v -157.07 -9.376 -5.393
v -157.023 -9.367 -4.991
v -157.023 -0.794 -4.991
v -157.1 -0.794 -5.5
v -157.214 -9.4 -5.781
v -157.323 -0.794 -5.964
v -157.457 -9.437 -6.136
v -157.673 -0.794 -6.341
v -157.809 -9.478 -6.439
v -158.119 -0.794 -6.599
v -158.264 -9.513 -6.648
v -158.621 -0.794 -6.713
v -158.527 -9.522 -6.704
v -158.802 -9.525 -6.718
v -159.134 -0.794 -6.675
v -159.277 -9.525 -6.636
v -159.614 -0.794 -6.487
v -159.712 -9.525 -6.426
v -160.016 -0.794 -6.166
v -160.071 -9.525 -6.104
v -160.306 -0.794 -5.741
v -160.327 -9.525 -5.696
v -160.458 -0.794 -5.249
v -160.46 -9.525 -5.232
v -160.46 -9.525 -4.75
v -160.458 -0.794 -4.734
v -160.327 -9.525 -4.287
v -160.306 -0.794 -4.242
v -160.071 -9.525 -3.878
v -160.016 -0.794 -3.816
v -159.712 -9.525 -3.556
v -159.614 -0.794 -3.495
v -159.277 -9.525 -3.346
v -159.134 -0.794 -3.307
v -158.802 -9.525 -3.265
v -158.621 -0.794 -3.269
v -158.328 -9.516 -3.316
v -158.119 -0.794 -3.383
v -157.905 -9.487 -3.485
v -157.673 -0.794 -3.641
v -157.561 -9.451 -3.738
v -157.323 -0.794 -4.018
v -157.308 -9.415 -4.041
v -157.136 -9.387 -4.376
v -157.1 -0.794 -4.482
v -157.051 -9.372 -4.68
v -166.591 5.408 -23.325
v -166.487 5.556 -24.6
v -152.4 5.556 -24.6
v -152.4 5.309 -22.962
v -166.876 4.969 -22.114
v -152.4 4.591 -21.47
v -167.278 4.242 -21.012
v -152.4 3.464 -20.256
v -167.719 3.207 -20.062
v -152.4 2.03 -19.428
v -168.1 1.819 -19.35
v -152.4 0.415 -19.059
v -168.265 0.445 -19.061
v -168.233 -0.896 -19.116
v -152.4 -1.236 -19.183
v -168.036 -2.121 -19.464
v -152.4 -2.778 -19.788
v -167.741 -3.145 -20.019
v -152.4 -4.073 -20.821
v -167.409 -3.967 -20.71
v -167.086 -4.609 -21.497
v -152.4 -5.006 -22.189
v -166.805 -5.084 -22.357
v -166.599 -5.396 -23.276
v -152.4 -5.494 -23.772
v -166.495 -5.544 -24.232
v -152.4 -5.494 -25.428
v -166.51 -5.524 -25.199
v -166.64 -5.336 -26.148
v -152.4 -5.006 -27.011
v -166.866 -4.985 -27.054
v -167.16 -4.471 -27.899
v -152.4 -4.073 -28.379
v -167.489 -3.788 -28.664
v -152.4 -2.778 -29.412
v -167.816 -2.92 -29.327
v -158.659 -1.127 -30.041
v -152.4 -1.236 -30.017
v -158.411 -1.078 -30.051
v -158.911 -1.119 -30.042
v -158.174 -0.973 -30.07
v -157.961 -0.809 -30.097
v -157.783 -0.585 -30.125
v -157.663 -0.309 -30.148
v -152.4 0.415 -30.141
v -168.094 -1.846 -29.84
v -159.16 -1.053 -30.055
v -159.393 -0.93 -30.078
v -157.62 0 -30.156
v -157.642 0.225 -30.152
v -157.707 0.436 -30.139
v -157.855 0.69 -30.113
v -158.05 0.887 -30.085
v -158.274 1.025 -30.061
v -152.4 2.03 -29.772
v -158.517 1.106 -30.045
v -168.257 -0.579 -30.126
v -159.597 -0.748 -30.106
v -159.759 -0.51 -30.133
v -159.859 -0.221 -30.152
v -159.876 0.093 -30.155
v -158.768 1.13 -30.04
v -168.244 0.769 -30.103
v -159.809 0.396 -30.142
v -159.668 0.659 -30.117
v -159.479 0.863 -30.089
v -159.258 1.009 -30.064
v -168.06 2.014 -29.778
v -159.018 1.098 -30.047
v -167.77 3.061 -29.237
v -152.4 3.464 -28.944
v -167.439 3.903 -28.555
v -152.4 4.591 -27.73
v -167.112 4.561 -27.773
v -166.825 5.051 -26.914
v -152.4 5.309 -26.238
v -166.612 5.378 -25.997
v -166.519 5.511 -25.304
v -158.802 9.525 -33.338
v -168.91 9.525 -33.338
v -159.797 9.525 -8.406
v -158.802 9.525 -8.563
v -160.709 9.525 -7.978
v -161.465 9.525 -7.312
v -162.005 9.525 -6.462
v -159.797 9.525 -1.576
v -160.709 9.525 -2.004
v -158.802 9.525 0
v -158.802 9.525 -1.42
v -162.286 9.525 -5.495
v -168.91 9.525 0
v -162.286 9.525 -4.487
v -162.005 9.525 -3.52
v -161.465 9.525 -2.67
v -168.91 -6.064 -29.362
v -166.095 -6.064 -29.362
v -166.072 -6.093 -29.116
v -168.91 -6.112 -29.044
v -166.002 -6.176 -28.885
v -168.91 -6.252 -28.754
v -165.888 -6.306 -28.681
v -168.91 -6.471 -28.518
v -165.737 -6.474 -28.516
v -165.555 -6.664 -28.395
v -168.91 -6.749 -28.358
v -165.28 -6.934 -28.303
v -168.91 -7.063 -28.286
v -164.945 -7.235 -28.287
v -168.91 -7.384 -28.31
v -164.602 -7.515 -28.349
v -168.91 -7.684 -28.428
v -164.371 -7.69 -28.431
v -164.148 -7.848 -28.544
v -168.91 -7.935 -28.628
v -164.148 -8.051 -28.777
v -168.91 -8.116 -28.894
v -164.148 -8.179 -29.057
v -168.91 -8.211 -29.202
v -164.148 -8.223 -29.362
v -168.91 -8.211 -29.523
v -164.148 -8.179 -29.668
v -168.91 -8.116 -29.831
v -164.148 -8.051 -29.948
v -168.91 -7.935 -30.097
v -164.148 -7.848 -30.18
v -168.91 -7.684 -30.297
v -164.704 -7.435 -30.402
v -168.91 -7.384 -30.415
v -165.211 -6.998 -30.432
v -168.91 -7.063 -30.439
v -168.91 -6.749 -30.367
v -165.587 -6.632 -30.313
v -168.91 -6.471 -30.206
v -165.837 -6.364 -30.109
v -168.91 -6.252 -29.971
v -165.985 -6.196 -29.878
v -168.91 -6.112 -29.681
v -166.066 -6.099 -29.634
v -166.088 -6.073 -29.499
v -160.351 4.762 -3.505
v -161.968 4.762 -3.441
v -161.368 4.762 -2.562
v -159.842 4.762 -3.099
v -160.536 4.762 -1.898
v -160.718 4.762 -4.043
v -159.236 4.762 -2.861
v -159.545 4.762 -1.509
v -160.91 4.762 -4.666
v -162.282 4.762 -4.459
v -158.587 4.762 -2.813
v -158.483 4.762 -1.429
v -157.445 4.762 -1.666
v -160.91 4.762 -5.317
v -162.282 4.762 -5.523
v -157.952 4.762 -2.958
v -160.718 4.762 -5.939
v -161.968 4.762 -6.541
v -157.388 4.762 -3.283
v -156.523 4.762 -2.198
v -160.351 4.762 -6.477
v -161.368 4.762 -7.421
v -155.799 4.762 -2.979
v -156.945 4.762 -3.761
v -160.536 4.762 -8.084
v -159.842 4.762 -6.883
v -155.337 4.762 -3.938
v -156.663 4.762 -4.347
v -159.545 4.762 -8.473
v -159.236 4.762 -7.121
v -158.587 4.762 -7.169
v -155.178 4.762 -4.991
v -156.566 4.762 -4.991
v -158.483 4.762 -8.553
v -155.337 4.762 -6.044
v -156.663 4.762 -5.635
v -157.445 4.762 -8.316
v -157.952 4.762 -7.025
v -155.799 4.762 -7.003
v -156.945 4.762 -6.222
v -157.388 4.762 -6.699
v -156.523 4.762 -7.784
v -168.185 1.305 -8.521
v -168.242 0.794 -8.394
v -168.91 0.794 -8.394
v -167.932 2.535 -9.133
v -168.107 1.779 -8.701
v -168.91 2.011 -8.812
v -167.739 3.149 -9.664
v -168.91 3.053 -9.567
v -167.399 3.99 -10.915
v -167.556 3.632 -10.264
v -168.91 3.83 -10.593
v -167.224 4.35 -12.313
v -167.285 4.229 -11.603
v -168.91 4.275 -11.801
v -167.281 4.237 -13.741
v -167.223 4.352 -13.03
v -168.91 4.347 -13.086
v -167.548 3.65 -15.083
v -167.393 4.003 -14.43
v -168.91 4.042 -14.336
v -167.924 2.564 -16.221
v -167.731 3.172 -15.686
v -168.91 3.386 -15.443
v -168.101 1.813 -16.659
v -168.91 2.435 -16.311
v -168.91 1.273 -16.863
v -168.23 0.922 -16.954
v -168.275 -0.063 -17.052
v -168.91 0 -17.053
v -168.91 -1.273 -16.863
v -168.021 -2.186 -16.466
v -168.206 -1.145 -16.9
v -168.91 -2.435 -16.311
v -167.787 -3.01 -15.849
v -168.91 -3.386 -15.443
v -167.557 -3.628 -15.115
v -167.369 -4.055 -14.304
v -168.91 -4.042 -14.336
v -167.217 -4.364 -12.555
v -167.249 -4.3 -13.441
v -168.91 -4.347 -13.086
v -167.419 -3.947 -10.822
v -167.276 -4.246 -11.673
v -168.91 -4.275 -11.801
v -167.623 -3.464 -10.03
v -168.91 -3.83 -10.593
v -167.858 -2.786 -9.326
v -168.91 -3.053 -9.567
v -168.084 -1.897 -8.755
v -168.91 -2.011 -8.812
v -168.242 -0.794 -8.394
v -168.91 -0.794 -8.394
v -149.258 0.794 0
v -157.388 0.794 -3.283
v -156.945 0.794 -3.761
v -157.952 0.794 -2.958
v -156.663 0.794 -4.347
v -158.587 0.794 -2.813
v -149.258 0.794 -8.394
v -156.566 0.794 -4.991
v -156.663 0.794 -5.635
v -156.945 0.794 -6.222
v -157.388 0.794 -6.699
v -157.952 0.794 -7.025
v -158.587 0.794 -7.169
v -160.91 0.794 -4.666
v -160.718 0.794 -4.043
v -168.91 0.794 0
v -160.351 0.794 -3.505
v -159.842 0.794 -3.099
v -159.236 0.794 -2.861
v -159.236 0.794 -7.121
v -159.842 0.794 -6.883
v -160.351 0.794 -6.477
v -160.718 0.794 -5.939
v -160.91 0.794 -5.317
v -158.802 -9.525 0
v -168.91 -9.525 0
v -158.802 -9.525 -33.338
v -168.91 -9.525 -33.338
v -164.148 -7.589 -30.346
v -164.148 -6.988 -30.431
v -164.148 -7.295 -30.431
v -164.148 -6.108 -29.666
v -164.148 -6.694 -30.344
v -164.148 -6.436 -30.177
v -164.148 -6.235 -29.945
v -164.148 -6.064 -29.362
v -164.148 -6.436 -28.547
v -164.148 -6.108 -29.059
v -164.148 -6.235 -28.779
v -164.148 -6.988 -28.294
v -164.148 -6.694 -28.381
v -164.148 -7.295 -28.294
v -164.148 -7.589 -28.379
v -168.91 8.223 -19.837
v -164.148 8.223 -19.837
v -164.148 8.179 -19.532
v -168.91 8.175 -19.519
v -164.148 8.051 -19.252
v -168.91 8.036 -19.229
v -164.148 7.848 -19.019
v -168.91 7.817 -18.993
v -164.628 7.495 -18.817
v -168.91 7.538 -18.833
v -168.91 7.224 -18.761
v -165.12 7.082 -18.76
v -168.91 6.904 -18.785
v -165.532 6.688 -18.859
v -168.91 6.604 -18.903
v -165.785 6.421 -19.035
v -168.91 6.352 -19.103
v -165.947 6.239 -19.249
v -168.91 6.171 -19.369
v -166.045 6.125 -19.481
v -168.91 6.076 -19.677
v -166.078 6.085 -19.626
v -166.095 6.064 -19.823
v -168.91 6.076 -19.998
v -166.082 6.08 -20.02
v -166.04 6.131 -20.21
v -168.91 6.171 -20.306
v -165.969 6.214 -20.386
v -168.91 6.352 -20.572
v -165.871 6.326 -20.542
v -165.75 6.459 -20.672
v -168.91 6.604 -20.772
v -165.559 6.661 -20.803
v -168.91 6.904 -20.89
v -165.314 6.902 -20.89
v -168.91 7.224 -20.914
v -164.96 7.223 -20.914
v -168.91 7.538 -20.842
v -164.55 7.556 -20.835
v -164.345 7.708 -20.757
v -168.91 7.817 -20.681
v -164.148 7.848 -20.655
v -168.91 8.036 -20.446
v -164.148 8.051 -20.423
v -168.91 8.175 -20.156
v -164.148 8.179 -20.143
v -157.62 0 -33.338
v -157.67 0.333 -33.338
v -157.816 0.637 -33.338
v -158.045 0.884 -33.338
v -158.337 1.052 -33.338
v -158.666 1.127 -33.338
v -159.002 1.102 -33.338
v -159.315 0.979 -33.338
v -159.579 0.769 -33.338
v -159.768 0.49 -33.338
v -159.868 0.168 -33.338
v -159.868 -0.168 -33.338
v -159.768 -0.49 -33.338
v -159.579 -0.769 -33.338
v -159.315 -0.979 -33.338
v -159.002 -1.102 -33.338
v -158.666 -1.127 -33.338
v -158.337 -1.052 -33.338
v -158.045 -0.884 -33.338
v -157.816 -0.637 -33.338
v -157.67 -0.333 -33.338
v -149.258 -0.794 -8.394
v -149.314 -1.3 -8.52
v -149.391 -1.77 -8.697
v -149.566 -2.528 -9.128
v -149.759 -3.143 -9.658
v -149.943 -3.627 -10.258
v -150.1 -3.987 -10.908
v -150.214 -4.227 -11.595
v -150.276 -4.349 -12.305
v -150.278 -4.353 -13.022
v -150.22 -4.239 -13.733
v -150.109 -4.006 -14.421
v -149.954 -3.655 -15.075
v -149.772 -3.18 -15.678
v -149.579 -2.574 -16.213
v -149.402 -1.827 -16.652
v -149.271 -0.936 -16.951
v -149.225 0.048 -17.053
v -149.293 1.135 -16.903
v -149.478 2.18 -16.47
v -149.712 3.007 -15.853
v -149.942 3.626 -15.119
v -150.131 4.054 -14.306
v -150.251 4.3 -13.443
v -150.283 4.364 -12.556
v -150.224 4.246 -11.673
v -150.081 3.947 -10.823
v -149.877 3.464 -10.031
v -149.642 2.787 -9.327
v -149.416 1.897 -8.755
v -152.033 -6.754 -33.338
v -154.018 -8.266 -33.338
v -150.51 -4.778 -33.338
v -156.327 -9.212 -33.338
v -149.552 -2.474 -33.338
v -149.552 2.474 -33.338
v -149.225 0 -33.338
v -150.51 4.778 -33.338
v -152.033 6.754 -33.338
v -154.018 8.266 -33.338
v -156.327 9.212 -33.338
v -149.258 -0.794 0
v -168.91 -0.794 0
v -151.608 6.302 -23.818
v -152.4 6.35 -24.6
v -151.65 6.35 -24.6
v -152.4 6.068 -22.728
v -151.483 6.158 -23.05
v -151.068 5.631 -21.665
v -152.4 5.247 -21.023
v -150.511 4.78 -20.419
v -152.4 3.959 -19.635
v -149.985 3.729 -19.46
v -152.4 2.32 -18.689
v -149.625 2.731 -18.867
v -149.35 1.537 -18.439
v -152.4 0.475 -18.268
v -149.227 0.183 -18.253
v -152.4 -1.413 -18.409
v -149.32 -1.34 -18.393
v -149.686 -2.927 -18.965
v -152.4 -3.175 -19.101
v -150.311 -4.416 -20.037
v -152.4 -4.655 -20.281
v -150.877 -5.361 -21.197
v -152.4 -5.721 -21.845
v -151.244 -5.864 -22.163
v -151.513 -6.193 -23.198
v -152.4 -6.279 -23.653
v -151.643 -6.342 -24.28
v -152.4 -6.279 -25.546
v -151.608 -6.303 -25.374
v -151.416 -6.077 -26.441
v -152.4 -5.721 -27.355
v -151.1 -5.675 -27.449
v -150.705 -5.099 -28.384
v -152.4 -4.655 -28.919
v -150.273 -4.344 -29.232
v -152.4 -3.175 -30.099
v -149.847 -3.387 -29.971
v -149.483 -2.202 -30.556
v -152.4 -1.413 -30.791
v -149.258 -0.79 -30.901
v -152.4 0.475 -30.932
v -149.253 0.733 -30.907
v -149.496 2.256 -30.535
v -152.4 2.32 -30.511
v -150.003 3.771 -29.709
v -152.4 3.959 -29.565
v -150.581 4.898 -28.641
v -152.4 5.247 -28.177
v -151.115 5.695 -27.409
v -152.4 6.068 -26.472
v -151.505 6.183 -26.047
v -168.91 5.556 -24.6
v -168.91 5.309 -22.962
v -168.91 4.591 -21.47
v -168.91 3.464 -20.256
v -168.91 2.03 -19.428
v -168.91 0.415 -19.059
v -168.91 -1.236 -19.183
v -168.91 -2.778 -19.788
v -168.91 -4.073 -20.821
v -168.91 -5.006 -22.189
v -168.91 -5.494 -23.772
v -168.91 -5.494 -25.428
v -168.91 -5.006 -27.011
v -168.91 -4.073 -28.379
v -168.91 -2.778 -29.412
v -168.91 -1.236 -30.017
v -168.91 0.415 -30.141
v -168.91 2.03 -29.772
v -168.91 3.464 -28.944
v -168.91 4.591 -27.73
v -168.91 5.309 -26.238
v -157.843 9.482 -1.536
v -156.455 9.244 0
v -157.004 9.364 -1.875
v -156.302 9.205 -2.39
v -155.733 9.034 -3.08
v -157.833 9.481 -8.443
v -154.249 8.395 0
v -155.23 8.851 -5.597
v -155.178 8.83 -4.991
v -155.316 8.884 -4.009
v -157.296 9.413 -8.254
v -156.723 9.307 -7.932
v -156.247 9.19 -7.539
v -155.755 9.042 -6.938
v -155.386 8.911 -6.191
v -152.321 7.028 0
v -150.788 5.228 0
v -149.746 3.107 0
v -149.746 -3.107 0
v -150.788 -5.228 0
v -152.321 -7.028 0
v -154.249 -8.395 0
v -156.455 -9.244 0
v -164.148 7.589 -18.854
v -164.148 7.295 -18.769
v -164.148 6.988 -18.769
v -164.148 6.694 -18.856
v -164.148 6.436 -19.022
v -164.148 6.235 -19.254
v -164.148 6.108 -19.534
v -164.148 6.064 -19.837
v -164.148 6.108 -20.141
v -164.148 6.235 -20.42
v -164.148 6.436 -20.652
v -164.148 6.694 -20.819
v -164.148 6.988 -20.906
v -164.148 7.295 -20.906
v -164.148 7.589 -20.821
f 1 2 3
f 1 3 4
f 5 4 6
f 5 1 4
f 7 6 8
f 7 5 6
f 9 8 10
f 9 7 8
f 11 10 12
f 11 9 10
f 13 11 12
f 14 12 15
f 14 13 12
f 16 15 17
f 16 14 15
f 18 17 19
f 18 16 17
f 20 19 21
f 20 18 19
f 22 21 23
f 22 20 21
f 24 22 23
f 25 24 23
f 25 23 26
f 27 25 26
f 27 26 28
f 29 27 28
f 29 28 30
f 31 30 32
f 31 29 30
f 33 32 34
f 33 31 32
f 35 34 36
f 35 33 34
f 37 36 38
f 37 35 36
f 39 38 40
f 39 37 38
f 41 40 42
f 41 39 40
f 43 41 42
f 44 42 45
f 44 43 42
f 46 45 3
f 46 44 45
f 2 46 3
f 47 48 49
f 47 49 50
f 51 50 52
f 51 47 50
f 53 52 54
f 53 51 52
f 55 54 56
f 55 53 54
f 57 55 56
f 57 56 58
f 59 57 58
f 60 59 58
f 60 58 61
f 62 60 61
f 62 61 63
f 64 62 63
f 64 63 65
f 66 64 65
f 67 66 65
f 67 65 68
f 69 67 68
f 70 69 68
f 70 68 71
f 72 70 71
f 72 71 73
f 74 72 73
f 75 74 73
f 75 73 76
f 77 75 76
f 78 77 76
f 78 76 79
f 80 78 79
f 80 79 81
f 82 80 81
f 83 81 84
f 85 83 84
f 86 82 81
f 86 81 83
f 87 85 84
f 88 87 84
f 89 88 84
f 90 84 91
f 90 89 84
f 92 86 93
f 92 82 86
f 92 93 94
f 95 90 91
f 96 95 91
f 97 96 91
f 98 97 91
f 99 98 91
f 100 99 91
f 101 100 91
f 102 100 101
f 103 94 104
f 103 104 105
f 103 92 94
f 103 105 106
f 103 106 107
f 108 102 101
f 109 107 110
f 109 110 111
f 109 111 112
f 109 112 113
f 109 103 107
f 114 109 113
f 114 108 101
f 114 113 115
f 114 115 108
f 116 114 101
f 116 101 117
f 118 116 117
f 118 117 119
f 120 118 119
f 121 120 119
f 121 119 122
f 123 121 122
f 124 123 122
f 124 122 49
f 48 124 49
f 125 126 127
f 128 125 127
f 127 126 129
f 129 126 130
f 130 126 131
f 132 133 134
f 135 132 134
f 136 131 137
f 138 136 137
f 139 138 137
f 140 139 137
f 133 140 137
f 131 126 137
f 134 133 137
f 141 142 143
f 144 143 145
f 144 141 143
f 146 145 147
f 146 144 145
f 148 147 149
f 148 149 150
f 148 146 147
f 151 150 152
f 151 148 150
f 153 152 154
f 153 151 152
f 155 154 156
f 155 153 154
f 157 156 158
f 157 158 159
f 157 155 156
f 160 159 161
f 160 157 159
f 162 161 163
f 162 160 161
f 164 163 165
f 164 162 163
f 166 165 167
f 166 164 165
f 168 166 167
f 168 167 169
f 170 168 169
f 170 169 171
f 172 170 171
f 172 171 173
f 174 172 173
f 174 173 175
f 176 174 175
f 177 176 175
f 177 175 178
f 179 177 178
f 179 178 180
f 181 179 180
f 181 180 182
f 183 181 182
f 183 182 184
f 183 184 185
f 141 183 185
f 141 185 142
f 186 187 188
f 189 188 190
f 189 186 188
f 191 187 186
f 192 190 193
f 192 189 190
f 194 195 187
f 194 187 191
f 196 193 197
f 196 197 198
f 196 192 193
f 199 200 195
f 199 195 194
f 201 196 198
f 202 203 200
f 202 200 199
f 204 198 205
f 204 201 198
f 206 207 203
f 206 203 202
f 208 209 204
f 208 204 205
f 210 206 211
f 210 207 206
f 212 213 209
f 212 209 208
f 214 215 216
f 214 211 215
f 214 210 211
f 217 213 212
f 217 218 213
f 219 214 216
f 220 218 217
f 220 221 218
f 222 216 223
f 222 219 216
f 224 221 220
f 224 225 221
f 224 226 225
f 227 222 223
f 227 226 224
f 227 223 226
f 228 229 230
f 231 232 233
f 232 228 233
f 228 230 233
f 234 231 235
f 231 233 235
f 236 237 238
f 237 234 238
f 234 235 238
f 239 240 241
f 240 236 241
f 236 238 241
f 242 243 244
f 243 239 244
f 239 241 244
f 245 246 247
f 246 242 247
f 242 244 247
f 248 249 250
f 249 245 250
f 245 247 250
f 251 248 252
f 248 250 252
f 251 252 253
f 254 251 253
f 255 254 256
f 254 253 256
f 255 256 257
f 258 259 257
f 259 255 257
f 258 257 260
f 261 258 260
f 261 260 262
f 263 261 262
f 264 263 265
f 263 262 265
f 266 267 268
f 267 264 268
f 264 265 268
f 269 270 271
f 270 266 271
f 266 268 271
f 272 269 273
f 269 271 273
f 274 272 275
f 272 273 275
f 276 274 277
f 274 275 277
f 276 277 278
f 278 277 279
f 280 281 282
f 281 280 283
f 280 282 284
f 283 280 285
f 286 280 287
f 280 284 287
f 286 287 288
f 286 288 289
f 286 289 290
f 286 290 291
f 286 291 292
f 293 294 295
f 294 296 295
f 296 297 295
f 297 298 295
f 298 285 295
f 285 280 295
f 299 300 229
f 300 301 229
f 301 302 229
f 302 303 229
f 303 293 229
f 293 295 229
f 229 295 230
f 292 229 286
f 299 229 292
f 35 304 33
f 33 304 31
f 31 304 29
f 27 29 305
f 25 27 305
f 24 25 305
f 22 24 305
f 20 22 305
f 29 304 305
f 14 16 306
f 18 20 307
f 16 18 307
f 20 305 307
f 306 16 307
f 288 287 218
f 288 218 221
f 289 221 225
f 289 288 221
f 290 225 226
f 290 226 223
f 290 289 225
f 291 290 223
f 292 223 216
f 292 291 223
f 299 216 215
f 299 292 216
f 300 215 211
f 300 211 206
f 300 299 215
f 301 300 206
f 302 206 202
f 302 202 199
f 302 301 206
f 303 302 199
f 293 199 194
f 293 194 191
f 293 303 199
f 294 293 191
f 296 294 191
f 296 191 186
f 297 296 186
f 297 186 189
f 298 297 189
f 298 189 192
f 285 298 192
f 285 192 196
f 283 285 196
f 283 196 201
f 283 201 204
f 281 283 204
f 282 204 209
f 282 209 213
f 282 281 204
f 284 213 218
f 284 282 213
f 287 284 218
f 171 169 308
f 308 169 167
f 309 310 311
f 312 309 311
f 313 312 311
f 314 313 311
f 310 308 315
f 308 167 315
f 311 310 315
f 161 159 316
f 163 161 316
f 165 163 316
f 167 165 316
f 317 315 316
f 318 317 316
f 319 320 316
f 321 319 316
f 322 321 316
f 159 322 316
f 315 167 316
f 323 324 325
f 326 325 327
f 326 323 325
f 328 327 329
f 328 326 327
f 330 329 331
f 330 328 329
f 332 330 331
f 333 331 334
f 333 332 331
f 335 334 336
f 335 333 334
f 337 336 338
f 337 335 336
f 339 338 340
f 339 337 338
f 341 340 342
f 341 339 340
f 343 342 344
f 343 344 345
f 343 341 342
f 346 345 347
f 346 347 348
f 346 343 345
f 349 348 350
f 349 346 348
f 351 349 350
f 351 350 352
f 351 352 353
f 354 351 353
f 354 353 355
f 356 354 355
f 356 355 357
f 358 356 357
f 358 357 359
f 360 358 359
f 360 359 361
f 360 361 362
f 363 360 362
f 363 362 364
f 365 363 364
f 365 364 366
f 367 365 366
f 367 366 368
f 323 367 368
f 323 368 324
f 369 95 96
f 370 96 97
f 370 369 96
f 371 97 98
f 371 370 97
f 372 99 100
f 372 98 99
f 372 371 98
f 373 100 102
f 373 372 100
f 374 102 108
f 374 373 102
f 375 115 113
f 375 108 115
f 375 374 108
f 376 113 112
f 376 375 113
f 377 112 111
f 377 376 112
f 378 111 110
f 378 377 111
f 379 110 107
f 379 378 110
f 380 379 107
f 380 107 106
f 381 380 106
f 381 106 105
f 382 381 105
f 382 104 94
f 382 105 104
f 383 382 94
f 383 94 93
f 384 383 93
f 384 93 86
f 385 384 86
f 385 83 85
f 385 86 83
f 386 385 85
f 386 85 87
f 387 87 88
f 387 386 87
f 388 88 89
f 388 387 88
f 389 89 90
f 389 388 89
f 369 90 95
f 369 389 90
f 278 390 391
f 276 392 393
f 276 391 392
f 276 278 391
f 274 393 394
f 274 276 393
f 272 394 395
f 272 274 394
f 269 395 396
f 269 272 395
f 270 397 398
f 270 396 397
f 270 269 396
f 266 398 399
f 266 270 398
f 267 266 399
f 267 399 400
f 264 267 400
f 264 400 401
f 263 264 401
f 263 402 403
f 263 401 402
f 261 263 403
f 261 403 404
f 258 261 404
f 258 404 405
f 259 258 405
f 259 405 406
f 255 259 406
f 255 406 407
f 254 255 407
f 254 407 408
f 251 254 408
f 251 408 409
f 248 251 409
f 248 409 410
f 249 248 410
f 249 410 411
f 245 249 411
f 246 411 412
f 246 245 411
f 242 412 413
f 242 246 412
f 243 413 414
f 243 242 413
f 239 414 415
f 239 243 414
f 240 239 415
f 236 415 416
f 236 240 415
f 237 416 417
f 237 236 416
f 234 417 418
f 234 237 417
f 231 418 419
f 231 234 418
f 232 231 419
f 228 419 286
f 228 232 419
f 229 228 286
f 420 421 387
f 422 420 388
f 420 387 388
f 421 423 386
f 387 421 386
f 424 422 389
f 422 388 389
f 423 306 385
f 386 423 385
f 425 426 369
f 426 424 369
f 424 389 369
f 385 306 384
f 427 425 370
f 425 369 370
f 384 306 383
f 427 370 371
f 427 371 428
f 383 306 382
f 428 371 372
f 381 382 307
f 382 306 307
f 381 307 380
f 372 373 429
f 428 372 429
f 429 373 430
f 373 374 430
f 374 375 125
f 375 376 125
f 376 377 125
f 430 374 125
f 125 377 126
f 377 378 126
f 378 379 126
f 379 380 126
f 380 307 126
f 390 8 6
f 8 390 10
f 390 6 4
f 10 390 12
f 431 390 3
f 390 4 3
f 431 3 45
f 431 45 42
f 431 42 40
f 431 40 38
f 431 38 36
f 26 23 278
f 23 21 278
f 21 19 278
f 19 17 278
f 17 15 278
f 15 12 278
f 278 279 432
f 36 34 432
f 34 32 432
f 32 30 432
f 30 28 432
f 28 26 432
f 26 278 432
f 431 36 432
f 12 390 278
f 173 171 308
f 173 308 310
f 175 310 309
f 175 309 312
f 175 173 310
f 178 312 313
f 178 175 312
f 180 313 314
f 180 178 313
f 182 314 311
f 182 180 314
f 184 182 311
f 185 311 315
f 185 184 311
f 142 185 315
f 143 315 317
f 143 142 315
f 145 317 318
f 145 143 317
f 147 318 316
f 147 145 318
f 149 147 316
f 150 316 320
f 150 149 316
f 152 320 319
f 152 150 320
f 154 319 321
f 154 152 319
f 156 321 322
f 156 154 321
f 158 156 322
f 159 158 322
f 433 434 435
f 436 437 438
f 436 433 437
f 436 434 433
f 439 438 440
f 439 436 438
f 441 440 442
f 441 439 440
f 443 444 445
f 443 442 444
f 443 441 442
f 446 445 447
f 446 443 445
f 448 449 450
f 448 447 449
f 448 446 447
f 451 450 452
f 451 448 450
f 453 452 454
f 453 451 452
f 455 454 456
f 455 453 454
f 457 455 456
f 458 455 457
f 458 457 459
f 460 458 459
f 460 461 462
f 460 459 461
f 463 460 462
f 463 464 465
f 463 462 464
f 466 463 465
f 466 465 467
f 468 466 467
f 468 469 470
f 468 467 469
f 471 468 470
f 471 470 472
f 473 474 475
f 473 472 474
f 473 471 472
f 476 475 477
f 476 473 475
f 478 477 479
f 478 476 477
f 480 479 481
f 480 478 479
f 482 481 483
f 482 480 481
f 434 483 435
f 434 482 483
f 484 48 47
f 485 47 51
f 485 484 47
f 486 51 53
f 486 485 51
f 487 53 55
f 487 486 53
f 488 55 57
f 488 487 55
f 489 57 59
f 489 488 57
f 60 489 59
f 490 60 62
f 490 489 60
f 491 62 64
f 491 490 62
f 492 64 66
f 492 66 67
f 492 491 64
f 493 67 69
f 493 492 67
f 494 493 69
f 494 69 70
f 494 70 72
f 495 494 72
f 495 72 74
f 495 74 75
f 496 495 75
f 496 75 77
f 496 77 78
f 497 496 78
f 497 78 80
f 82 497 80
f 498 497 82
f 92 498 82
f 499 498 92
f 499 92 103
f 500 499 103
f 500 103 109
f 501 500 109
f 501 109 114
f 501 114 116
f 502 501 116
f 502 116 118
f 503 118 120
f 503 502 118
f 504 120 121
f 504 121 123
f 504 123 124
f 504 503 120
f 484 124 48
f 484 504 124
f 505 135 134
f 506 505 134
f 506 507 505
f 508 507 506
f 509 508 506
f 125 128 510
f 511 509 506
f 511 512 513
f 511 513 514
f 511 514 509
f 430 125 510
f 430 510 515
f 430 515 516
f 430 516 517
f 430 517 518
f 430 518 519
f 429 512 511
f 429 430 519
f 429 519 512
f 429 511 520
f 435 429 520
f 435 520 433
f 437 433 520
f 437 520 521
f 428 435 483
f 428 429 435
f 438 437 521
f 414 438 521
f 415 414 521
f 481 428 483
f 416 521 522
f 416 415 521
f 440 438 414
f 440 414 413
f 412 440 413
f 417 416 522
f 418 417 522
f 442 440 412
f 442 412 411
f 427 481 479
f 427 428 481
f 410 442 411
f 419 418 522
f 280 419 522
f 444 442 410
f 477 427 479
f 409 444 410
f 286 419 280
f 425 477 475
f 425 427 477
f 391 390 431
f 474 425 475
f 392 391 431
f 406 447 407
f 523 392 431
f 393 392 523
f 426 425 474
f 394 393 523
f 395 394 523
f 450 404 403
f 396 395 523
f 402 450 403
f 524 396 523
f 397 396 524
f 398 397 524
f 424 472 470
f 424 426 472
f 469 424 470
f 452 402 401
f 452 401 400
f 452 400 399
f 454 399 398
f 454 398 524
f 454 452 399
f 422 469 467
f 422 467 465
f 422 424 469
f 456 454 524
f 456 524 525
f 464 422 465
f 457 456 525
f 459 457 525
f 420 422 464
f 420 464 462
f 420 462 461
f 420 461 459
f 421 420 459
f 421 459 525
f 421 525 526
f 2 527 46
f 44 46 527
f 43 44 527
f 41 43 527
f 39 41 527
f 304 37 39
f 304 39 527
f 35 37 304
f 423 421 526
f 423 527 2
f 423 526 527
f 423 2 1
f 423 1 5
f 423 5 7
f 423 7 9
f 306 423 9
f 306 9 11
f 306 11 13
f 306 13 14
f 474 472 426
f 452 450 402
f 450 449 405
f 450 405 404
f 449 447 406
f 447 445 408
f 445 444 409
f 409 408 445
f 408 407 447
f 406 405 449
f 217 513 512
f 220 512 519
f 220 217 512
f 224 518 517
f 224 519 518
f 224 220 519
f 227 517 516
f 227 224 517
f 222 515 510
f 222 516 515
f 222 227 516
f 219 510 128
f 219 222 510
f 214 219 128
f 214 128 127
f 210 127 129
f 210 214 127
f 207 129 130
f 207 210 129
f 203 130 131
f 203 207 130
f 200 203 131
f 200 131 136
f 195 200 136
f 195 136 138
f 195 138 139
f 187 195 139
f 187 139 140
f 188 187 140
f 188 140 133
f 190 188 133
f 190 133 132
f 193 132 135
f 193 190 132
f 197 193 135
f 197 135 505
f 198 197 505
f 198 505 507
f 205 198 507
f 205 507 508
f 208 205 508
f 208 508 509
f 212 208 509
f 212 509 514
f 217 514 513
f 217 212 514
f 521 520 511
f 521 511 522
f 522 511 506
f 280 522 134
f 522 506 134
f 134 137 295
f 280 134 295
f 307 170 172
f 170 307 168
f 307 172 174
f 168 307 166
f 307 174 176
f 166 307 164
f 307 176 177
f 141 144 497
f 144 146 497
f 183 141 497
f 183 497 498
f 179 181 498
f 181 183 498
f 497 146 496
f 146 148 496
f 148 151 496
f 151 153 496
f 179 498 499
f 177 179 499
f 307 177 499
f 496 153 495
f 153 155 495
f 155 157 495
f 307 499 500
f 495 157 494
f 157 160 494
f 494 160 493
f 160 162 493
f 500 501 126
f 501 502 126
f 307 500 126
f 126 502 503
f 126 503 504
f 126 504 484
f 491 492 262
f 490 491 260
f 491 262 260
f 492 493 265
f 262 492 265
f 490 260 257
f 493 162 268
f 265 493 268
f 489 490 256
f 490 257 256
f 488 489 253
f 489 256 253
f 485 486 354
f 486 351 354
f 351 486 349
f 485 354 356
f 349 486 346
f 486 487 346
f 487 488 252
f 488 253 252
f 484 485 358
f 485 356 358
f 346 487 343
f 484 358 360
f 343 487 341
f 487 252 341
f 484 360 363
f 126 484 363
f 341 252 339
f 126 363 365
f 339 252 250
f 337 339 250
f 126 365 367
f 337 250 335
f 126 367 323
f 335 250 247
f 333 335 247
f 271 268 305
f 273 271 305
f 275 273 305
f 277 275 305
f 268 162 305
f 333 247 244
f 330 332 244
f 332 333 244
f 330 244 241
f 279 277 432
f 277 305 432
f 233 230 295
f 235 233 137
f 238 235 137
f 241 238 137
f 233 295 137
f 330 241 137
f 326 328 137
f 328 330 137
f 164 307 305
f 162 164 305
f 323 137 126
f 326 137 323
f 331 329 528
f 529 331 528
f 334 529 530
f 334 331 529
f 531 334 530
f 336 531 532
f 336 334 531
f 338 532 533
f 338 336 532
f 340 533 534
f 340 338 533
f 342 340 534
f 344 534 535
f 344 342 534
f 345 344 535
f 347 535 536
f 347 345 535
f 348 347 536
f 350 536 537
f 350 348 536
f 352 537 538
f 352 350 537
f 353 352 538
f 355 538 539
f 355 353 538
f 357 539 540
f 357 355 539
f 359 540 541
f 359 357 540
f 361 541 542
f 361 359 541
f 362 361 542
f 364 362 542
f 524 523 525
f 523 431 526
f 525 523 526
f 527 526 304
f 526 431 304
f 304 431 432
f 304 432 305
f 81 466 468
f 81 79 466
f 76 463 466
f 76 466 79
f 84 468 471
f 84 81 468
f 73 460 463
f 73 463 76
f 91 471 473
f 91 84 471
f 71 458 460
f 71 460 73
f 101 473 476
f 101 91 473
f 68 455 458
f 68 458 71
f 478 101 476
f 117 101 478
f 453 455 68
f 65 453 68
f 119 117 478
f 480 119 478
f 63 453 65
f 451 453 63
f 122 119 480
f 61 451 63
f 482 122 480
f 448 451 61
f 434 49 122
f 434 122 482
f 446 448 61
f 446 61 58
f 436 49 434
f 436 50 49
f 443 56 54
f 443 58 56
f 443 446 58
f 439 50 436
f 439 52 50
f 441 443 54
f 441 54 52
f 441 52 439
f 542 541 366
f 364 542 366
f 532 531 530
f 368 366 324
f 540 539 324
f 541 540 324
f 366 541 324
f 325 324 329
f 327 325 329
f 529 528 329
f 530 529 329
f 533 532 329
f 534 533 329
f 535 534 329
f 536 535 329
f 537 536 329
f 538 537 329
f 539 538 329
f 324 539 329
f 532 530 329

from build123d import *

# Parameters (mm, degrees)
SKETCH1_W              = 9.525
SKETCH1_H              = 33.3375
COMBINE1_START         = -168.91
COMBINE1_OUTLINE_R     = 5.55625
COMBINE1_DEPTH         = 20.91
COMBINE1_START_2       = -152.4
COMBINE1_2_OUTLINE_R   = 6.35
COMBINE1_2_OUTLINE_R_2 = 5.55625
COMBINE1_2_DEPTH       = 4.4
COMBINE1_START_3       = -166.890966931
COMBINE1_3_OUTLINE_R   = 1.0795
COMBINE1_3_DEPTH       = 2.743466931
COMBINE1_4_OUTLINE_R   = 1.0795
COMBINE1_4_OUTLINE_R_2 = 6.35
COMBINE1_4_DEPTH       = 10.107803
COMBINE1_5_OUTLINE_R   = 6.35
COMBINE1_5_OUTLINE_R_2 = 5.55625
COMBINE1_5_DEPTH       = 4.7625
COMBINE1_START_4       = -164.1475
COMBINE1_6_OUTLINE_R   = 1.0795
COMBINE1_6_DEPTH       = 1.8256249
COMBINE1_START_5       = 4.7625
COMBINE1_7_OUTLINE_R   = 3.571875
COMBINE1_7_DEPTH       = 4.7625
COMBINE1_START_6       = -11
COMBINE1_8_OUTLINE_R   = 1.7272
COMBINE1_8_DEPTH       = 15.7625
COMBINE1_START_7       = 0.793749963
COMBINE1_9_OUTLINE_R   = 2.1844
COMBINE1_9_OUTLINE_R_2 = 1.7272
COMBINE1_9_DEPTH       = 3.968750037
COMBINE1_START_8       = -33.3375
COMBINE1_10_OUTLINE_R  = 1.1303
COMBINE1_10_DEPTH      = 3.297532088


with BuildPart() as part:
    # Sketch1 → Revolve1 (revolve)
    with BuildSketch(Plane(origin=(0, 0, 0), x_dir=(1, 0, 0), z_dir=(0, 1, 0))):
        with Locations((-153.9875, 16.66875)):
            Rectangle(SKETCH1_W, SKETCH1_H)
    revolve(axis=Axis((-158.75, 0, 0), (0, 0, -1)))

    # Combine1: read off the stored shape, not the designer's step
    # Combine1 outline → Combine1 (cut)
    with BuildSketch(Plane.YZ.offset(COMBINE1_START)):
        with BuildLine():
            Line((0.79375, 0), (-0.79375, 0))
            Line((-0.79375, 0), (-0.793749936, -8.394440501))
            ThreePointArc((-0.793749936, -8.394440501), (-1e-08, -17.052925), (0.793749959, -8.394440505))
            Line((0.793749959, -8.394440505), (0.79375, 0))
        make_face()
        with Locations((0, -24.5999)):
            Circle(COMBINE1_OUTLINE_R)
    extrude(amount=COMBINE1_DEPTH, mode=Mode.SUBTRACT)

    # Combine1 2 outline → Combine1 2 (cut)
    with BuildSketch(Plane.YZ.offset(COMBINE1_START_2)):
        with Locations((0, -24.5999)):
            Circle(COMBINE1_2_OUTLINE_R)
        with Locations((0, -24.5999)):
            Circle(COMBINE1_2_OUTLINE_R_2, mode=Mode.SUBTRACT)
    extrude(amount=COMBINE1_2_DEPTH, mode=Mode.SUBTRACT)

    # Combine1 3 outline → Combine1 3 (cut)
    with BuildSketch(Plane.YZ.offset(COMBINE1_START_3)):
        with Locations((7.14375, -19.8374)):
            Circle(COMBINE1_3_OUTLINE_R)
        with Locations((-7.14375, -29.3624)):
            Circle(COMBINE1_3_OUTLINE_R)
    extrude(amount=COMBINE1_3_DEPTH, mode=Mode.SUBTRACT)

    # Combine1 4 outline → Combine1 4 (add)
    with BuildSketch(Plane.YZ.offset(COMBINE1_START)):
        with BuildLine():
            Line((-9.525, 0), (-9.525, -33.3375))
            Line((-9.525, -33.3375), (9.525, -33.3375))
            Line((9.525, -33.3375), (9.525, 0))
            Line((9.525, 0), (0.79375, 0))
            Line((0.79375, 0), (0.793749959, -8.394440505))
            ThreePointArc((0.793749959, -8.394440505), (-1e-08, -17.052925), (-0.793749936, -8.394440501))
            Line((-0.793749936, -8.394440501), (-0.79375, 0))
            Line((-0.79375, 0), (-9.525, 0))
        make_face()
        with Locations((-7.14375, -29.3624)):
            Circle(COMBINE1_4_OUTLINE_R, mode=Mode.SUBTRACT)
        with Locations((0, -24.5999)):
            Circle(COMBINE1_4_OUTLINE_R_2, mode=Mode.SUBTRACT)
        with Locations((7.14375, -19.8374)):
            Circle(COMBINE1_4_OUTLINE_R, mode=Mode.SUBTRACT)
    extrude(amount=COMBINE1_4_DEPTH)

    # Combine1 5 outline → Combine1 5 (add)
    with BuildSketch(Plane.YZ.offset(COMBINE1_START)):
        with Locations((0, -24.5999)):
            Circle(COMBINE1_5_OUTLINE_R)
        with Locations((0, -24.5999)):
            Circle(COMBINE1_5_OUTLINE_R_2, mode=Mode.SUBTRACT)
    extrude(amount=COMBINE1_5_DEPTH)

    # Combine1 6 outline → Combine1 6 (add)
    with BuildSketch(Plane.YZ.offset(COMBINE1_START_4)):
        with Locations((7.14375, -19.8374)):
            Circle(COMBINE1_6_OUTLINE_R)
        with Locations((-7.14375, -29.3624)):
            Circle(COMBINE1_6_OUTLINE_R)
    extrude(amount=COMBINE1_6_DEPTH)

    # Combine1 7 outline → Combine1 7 (cut)
    with BuildSketch(Plane(origin=(0, 0, 0), x_dir=(1, 0, 0), z_dir=(0, 1, 0)).offset(COMBINE1_START_5)):
        with Locations((-158.75, 4.9911)):
            Circle(COMBINE1_7_OUTLINE_R)
    extrude(amount=COMBINE1_7_DEPTH, mode=Mode.SUBTRACT)

    # Combine1 8 outline → Combine1 8 (cut)
    with BuildSketch(Plane(origin=(0, 0, 0), x_dir=(1, 0, 0), z_dir=(0, 1, 0)).offset(COMBINE1_START_6)):
        with Locations((-158.75, 4.9911)):
            Circle(COMBINE1_8_OUTLINE_R)
    extrude(amount=COMBINE1_8_DEPTH, mode=Mode.SUBTRACT)

    # Combine1 9 outline → Combine1 9 (cut)
    with BuildSketch(Plane(origin=(0, 0, 0), x_dir=(1, 0, 0), z_dir=(0, 1, 0)).offset(COMBINE1_START_7)):
        with Locations((-158.75, 4.9911)):
            Circle(COMBINE1_9_OUTLINE_R)
        with Locations((-158.75, 4.9911)):
            Circle(COMBINE1_9_OUTLINE_R_2, mode=Mode.SUBTRACT)
    extrude(amount=COMBINE1_9_DEPTH, mode=Mode.SUBTRACT)

    # Combine1 10 outline → Combine1 10 (cut)
    with BuildSketch(Plane.XY.offset(COMBINE1_START_8)):
        with Locations((-158.75, 0)):
            Circle(COMBINE1_10_OUTLINE_R)
    extrude(amount=COMBINE1_10_DEPTH, mode=Mode.SUBTRACT)


solid = part.part
